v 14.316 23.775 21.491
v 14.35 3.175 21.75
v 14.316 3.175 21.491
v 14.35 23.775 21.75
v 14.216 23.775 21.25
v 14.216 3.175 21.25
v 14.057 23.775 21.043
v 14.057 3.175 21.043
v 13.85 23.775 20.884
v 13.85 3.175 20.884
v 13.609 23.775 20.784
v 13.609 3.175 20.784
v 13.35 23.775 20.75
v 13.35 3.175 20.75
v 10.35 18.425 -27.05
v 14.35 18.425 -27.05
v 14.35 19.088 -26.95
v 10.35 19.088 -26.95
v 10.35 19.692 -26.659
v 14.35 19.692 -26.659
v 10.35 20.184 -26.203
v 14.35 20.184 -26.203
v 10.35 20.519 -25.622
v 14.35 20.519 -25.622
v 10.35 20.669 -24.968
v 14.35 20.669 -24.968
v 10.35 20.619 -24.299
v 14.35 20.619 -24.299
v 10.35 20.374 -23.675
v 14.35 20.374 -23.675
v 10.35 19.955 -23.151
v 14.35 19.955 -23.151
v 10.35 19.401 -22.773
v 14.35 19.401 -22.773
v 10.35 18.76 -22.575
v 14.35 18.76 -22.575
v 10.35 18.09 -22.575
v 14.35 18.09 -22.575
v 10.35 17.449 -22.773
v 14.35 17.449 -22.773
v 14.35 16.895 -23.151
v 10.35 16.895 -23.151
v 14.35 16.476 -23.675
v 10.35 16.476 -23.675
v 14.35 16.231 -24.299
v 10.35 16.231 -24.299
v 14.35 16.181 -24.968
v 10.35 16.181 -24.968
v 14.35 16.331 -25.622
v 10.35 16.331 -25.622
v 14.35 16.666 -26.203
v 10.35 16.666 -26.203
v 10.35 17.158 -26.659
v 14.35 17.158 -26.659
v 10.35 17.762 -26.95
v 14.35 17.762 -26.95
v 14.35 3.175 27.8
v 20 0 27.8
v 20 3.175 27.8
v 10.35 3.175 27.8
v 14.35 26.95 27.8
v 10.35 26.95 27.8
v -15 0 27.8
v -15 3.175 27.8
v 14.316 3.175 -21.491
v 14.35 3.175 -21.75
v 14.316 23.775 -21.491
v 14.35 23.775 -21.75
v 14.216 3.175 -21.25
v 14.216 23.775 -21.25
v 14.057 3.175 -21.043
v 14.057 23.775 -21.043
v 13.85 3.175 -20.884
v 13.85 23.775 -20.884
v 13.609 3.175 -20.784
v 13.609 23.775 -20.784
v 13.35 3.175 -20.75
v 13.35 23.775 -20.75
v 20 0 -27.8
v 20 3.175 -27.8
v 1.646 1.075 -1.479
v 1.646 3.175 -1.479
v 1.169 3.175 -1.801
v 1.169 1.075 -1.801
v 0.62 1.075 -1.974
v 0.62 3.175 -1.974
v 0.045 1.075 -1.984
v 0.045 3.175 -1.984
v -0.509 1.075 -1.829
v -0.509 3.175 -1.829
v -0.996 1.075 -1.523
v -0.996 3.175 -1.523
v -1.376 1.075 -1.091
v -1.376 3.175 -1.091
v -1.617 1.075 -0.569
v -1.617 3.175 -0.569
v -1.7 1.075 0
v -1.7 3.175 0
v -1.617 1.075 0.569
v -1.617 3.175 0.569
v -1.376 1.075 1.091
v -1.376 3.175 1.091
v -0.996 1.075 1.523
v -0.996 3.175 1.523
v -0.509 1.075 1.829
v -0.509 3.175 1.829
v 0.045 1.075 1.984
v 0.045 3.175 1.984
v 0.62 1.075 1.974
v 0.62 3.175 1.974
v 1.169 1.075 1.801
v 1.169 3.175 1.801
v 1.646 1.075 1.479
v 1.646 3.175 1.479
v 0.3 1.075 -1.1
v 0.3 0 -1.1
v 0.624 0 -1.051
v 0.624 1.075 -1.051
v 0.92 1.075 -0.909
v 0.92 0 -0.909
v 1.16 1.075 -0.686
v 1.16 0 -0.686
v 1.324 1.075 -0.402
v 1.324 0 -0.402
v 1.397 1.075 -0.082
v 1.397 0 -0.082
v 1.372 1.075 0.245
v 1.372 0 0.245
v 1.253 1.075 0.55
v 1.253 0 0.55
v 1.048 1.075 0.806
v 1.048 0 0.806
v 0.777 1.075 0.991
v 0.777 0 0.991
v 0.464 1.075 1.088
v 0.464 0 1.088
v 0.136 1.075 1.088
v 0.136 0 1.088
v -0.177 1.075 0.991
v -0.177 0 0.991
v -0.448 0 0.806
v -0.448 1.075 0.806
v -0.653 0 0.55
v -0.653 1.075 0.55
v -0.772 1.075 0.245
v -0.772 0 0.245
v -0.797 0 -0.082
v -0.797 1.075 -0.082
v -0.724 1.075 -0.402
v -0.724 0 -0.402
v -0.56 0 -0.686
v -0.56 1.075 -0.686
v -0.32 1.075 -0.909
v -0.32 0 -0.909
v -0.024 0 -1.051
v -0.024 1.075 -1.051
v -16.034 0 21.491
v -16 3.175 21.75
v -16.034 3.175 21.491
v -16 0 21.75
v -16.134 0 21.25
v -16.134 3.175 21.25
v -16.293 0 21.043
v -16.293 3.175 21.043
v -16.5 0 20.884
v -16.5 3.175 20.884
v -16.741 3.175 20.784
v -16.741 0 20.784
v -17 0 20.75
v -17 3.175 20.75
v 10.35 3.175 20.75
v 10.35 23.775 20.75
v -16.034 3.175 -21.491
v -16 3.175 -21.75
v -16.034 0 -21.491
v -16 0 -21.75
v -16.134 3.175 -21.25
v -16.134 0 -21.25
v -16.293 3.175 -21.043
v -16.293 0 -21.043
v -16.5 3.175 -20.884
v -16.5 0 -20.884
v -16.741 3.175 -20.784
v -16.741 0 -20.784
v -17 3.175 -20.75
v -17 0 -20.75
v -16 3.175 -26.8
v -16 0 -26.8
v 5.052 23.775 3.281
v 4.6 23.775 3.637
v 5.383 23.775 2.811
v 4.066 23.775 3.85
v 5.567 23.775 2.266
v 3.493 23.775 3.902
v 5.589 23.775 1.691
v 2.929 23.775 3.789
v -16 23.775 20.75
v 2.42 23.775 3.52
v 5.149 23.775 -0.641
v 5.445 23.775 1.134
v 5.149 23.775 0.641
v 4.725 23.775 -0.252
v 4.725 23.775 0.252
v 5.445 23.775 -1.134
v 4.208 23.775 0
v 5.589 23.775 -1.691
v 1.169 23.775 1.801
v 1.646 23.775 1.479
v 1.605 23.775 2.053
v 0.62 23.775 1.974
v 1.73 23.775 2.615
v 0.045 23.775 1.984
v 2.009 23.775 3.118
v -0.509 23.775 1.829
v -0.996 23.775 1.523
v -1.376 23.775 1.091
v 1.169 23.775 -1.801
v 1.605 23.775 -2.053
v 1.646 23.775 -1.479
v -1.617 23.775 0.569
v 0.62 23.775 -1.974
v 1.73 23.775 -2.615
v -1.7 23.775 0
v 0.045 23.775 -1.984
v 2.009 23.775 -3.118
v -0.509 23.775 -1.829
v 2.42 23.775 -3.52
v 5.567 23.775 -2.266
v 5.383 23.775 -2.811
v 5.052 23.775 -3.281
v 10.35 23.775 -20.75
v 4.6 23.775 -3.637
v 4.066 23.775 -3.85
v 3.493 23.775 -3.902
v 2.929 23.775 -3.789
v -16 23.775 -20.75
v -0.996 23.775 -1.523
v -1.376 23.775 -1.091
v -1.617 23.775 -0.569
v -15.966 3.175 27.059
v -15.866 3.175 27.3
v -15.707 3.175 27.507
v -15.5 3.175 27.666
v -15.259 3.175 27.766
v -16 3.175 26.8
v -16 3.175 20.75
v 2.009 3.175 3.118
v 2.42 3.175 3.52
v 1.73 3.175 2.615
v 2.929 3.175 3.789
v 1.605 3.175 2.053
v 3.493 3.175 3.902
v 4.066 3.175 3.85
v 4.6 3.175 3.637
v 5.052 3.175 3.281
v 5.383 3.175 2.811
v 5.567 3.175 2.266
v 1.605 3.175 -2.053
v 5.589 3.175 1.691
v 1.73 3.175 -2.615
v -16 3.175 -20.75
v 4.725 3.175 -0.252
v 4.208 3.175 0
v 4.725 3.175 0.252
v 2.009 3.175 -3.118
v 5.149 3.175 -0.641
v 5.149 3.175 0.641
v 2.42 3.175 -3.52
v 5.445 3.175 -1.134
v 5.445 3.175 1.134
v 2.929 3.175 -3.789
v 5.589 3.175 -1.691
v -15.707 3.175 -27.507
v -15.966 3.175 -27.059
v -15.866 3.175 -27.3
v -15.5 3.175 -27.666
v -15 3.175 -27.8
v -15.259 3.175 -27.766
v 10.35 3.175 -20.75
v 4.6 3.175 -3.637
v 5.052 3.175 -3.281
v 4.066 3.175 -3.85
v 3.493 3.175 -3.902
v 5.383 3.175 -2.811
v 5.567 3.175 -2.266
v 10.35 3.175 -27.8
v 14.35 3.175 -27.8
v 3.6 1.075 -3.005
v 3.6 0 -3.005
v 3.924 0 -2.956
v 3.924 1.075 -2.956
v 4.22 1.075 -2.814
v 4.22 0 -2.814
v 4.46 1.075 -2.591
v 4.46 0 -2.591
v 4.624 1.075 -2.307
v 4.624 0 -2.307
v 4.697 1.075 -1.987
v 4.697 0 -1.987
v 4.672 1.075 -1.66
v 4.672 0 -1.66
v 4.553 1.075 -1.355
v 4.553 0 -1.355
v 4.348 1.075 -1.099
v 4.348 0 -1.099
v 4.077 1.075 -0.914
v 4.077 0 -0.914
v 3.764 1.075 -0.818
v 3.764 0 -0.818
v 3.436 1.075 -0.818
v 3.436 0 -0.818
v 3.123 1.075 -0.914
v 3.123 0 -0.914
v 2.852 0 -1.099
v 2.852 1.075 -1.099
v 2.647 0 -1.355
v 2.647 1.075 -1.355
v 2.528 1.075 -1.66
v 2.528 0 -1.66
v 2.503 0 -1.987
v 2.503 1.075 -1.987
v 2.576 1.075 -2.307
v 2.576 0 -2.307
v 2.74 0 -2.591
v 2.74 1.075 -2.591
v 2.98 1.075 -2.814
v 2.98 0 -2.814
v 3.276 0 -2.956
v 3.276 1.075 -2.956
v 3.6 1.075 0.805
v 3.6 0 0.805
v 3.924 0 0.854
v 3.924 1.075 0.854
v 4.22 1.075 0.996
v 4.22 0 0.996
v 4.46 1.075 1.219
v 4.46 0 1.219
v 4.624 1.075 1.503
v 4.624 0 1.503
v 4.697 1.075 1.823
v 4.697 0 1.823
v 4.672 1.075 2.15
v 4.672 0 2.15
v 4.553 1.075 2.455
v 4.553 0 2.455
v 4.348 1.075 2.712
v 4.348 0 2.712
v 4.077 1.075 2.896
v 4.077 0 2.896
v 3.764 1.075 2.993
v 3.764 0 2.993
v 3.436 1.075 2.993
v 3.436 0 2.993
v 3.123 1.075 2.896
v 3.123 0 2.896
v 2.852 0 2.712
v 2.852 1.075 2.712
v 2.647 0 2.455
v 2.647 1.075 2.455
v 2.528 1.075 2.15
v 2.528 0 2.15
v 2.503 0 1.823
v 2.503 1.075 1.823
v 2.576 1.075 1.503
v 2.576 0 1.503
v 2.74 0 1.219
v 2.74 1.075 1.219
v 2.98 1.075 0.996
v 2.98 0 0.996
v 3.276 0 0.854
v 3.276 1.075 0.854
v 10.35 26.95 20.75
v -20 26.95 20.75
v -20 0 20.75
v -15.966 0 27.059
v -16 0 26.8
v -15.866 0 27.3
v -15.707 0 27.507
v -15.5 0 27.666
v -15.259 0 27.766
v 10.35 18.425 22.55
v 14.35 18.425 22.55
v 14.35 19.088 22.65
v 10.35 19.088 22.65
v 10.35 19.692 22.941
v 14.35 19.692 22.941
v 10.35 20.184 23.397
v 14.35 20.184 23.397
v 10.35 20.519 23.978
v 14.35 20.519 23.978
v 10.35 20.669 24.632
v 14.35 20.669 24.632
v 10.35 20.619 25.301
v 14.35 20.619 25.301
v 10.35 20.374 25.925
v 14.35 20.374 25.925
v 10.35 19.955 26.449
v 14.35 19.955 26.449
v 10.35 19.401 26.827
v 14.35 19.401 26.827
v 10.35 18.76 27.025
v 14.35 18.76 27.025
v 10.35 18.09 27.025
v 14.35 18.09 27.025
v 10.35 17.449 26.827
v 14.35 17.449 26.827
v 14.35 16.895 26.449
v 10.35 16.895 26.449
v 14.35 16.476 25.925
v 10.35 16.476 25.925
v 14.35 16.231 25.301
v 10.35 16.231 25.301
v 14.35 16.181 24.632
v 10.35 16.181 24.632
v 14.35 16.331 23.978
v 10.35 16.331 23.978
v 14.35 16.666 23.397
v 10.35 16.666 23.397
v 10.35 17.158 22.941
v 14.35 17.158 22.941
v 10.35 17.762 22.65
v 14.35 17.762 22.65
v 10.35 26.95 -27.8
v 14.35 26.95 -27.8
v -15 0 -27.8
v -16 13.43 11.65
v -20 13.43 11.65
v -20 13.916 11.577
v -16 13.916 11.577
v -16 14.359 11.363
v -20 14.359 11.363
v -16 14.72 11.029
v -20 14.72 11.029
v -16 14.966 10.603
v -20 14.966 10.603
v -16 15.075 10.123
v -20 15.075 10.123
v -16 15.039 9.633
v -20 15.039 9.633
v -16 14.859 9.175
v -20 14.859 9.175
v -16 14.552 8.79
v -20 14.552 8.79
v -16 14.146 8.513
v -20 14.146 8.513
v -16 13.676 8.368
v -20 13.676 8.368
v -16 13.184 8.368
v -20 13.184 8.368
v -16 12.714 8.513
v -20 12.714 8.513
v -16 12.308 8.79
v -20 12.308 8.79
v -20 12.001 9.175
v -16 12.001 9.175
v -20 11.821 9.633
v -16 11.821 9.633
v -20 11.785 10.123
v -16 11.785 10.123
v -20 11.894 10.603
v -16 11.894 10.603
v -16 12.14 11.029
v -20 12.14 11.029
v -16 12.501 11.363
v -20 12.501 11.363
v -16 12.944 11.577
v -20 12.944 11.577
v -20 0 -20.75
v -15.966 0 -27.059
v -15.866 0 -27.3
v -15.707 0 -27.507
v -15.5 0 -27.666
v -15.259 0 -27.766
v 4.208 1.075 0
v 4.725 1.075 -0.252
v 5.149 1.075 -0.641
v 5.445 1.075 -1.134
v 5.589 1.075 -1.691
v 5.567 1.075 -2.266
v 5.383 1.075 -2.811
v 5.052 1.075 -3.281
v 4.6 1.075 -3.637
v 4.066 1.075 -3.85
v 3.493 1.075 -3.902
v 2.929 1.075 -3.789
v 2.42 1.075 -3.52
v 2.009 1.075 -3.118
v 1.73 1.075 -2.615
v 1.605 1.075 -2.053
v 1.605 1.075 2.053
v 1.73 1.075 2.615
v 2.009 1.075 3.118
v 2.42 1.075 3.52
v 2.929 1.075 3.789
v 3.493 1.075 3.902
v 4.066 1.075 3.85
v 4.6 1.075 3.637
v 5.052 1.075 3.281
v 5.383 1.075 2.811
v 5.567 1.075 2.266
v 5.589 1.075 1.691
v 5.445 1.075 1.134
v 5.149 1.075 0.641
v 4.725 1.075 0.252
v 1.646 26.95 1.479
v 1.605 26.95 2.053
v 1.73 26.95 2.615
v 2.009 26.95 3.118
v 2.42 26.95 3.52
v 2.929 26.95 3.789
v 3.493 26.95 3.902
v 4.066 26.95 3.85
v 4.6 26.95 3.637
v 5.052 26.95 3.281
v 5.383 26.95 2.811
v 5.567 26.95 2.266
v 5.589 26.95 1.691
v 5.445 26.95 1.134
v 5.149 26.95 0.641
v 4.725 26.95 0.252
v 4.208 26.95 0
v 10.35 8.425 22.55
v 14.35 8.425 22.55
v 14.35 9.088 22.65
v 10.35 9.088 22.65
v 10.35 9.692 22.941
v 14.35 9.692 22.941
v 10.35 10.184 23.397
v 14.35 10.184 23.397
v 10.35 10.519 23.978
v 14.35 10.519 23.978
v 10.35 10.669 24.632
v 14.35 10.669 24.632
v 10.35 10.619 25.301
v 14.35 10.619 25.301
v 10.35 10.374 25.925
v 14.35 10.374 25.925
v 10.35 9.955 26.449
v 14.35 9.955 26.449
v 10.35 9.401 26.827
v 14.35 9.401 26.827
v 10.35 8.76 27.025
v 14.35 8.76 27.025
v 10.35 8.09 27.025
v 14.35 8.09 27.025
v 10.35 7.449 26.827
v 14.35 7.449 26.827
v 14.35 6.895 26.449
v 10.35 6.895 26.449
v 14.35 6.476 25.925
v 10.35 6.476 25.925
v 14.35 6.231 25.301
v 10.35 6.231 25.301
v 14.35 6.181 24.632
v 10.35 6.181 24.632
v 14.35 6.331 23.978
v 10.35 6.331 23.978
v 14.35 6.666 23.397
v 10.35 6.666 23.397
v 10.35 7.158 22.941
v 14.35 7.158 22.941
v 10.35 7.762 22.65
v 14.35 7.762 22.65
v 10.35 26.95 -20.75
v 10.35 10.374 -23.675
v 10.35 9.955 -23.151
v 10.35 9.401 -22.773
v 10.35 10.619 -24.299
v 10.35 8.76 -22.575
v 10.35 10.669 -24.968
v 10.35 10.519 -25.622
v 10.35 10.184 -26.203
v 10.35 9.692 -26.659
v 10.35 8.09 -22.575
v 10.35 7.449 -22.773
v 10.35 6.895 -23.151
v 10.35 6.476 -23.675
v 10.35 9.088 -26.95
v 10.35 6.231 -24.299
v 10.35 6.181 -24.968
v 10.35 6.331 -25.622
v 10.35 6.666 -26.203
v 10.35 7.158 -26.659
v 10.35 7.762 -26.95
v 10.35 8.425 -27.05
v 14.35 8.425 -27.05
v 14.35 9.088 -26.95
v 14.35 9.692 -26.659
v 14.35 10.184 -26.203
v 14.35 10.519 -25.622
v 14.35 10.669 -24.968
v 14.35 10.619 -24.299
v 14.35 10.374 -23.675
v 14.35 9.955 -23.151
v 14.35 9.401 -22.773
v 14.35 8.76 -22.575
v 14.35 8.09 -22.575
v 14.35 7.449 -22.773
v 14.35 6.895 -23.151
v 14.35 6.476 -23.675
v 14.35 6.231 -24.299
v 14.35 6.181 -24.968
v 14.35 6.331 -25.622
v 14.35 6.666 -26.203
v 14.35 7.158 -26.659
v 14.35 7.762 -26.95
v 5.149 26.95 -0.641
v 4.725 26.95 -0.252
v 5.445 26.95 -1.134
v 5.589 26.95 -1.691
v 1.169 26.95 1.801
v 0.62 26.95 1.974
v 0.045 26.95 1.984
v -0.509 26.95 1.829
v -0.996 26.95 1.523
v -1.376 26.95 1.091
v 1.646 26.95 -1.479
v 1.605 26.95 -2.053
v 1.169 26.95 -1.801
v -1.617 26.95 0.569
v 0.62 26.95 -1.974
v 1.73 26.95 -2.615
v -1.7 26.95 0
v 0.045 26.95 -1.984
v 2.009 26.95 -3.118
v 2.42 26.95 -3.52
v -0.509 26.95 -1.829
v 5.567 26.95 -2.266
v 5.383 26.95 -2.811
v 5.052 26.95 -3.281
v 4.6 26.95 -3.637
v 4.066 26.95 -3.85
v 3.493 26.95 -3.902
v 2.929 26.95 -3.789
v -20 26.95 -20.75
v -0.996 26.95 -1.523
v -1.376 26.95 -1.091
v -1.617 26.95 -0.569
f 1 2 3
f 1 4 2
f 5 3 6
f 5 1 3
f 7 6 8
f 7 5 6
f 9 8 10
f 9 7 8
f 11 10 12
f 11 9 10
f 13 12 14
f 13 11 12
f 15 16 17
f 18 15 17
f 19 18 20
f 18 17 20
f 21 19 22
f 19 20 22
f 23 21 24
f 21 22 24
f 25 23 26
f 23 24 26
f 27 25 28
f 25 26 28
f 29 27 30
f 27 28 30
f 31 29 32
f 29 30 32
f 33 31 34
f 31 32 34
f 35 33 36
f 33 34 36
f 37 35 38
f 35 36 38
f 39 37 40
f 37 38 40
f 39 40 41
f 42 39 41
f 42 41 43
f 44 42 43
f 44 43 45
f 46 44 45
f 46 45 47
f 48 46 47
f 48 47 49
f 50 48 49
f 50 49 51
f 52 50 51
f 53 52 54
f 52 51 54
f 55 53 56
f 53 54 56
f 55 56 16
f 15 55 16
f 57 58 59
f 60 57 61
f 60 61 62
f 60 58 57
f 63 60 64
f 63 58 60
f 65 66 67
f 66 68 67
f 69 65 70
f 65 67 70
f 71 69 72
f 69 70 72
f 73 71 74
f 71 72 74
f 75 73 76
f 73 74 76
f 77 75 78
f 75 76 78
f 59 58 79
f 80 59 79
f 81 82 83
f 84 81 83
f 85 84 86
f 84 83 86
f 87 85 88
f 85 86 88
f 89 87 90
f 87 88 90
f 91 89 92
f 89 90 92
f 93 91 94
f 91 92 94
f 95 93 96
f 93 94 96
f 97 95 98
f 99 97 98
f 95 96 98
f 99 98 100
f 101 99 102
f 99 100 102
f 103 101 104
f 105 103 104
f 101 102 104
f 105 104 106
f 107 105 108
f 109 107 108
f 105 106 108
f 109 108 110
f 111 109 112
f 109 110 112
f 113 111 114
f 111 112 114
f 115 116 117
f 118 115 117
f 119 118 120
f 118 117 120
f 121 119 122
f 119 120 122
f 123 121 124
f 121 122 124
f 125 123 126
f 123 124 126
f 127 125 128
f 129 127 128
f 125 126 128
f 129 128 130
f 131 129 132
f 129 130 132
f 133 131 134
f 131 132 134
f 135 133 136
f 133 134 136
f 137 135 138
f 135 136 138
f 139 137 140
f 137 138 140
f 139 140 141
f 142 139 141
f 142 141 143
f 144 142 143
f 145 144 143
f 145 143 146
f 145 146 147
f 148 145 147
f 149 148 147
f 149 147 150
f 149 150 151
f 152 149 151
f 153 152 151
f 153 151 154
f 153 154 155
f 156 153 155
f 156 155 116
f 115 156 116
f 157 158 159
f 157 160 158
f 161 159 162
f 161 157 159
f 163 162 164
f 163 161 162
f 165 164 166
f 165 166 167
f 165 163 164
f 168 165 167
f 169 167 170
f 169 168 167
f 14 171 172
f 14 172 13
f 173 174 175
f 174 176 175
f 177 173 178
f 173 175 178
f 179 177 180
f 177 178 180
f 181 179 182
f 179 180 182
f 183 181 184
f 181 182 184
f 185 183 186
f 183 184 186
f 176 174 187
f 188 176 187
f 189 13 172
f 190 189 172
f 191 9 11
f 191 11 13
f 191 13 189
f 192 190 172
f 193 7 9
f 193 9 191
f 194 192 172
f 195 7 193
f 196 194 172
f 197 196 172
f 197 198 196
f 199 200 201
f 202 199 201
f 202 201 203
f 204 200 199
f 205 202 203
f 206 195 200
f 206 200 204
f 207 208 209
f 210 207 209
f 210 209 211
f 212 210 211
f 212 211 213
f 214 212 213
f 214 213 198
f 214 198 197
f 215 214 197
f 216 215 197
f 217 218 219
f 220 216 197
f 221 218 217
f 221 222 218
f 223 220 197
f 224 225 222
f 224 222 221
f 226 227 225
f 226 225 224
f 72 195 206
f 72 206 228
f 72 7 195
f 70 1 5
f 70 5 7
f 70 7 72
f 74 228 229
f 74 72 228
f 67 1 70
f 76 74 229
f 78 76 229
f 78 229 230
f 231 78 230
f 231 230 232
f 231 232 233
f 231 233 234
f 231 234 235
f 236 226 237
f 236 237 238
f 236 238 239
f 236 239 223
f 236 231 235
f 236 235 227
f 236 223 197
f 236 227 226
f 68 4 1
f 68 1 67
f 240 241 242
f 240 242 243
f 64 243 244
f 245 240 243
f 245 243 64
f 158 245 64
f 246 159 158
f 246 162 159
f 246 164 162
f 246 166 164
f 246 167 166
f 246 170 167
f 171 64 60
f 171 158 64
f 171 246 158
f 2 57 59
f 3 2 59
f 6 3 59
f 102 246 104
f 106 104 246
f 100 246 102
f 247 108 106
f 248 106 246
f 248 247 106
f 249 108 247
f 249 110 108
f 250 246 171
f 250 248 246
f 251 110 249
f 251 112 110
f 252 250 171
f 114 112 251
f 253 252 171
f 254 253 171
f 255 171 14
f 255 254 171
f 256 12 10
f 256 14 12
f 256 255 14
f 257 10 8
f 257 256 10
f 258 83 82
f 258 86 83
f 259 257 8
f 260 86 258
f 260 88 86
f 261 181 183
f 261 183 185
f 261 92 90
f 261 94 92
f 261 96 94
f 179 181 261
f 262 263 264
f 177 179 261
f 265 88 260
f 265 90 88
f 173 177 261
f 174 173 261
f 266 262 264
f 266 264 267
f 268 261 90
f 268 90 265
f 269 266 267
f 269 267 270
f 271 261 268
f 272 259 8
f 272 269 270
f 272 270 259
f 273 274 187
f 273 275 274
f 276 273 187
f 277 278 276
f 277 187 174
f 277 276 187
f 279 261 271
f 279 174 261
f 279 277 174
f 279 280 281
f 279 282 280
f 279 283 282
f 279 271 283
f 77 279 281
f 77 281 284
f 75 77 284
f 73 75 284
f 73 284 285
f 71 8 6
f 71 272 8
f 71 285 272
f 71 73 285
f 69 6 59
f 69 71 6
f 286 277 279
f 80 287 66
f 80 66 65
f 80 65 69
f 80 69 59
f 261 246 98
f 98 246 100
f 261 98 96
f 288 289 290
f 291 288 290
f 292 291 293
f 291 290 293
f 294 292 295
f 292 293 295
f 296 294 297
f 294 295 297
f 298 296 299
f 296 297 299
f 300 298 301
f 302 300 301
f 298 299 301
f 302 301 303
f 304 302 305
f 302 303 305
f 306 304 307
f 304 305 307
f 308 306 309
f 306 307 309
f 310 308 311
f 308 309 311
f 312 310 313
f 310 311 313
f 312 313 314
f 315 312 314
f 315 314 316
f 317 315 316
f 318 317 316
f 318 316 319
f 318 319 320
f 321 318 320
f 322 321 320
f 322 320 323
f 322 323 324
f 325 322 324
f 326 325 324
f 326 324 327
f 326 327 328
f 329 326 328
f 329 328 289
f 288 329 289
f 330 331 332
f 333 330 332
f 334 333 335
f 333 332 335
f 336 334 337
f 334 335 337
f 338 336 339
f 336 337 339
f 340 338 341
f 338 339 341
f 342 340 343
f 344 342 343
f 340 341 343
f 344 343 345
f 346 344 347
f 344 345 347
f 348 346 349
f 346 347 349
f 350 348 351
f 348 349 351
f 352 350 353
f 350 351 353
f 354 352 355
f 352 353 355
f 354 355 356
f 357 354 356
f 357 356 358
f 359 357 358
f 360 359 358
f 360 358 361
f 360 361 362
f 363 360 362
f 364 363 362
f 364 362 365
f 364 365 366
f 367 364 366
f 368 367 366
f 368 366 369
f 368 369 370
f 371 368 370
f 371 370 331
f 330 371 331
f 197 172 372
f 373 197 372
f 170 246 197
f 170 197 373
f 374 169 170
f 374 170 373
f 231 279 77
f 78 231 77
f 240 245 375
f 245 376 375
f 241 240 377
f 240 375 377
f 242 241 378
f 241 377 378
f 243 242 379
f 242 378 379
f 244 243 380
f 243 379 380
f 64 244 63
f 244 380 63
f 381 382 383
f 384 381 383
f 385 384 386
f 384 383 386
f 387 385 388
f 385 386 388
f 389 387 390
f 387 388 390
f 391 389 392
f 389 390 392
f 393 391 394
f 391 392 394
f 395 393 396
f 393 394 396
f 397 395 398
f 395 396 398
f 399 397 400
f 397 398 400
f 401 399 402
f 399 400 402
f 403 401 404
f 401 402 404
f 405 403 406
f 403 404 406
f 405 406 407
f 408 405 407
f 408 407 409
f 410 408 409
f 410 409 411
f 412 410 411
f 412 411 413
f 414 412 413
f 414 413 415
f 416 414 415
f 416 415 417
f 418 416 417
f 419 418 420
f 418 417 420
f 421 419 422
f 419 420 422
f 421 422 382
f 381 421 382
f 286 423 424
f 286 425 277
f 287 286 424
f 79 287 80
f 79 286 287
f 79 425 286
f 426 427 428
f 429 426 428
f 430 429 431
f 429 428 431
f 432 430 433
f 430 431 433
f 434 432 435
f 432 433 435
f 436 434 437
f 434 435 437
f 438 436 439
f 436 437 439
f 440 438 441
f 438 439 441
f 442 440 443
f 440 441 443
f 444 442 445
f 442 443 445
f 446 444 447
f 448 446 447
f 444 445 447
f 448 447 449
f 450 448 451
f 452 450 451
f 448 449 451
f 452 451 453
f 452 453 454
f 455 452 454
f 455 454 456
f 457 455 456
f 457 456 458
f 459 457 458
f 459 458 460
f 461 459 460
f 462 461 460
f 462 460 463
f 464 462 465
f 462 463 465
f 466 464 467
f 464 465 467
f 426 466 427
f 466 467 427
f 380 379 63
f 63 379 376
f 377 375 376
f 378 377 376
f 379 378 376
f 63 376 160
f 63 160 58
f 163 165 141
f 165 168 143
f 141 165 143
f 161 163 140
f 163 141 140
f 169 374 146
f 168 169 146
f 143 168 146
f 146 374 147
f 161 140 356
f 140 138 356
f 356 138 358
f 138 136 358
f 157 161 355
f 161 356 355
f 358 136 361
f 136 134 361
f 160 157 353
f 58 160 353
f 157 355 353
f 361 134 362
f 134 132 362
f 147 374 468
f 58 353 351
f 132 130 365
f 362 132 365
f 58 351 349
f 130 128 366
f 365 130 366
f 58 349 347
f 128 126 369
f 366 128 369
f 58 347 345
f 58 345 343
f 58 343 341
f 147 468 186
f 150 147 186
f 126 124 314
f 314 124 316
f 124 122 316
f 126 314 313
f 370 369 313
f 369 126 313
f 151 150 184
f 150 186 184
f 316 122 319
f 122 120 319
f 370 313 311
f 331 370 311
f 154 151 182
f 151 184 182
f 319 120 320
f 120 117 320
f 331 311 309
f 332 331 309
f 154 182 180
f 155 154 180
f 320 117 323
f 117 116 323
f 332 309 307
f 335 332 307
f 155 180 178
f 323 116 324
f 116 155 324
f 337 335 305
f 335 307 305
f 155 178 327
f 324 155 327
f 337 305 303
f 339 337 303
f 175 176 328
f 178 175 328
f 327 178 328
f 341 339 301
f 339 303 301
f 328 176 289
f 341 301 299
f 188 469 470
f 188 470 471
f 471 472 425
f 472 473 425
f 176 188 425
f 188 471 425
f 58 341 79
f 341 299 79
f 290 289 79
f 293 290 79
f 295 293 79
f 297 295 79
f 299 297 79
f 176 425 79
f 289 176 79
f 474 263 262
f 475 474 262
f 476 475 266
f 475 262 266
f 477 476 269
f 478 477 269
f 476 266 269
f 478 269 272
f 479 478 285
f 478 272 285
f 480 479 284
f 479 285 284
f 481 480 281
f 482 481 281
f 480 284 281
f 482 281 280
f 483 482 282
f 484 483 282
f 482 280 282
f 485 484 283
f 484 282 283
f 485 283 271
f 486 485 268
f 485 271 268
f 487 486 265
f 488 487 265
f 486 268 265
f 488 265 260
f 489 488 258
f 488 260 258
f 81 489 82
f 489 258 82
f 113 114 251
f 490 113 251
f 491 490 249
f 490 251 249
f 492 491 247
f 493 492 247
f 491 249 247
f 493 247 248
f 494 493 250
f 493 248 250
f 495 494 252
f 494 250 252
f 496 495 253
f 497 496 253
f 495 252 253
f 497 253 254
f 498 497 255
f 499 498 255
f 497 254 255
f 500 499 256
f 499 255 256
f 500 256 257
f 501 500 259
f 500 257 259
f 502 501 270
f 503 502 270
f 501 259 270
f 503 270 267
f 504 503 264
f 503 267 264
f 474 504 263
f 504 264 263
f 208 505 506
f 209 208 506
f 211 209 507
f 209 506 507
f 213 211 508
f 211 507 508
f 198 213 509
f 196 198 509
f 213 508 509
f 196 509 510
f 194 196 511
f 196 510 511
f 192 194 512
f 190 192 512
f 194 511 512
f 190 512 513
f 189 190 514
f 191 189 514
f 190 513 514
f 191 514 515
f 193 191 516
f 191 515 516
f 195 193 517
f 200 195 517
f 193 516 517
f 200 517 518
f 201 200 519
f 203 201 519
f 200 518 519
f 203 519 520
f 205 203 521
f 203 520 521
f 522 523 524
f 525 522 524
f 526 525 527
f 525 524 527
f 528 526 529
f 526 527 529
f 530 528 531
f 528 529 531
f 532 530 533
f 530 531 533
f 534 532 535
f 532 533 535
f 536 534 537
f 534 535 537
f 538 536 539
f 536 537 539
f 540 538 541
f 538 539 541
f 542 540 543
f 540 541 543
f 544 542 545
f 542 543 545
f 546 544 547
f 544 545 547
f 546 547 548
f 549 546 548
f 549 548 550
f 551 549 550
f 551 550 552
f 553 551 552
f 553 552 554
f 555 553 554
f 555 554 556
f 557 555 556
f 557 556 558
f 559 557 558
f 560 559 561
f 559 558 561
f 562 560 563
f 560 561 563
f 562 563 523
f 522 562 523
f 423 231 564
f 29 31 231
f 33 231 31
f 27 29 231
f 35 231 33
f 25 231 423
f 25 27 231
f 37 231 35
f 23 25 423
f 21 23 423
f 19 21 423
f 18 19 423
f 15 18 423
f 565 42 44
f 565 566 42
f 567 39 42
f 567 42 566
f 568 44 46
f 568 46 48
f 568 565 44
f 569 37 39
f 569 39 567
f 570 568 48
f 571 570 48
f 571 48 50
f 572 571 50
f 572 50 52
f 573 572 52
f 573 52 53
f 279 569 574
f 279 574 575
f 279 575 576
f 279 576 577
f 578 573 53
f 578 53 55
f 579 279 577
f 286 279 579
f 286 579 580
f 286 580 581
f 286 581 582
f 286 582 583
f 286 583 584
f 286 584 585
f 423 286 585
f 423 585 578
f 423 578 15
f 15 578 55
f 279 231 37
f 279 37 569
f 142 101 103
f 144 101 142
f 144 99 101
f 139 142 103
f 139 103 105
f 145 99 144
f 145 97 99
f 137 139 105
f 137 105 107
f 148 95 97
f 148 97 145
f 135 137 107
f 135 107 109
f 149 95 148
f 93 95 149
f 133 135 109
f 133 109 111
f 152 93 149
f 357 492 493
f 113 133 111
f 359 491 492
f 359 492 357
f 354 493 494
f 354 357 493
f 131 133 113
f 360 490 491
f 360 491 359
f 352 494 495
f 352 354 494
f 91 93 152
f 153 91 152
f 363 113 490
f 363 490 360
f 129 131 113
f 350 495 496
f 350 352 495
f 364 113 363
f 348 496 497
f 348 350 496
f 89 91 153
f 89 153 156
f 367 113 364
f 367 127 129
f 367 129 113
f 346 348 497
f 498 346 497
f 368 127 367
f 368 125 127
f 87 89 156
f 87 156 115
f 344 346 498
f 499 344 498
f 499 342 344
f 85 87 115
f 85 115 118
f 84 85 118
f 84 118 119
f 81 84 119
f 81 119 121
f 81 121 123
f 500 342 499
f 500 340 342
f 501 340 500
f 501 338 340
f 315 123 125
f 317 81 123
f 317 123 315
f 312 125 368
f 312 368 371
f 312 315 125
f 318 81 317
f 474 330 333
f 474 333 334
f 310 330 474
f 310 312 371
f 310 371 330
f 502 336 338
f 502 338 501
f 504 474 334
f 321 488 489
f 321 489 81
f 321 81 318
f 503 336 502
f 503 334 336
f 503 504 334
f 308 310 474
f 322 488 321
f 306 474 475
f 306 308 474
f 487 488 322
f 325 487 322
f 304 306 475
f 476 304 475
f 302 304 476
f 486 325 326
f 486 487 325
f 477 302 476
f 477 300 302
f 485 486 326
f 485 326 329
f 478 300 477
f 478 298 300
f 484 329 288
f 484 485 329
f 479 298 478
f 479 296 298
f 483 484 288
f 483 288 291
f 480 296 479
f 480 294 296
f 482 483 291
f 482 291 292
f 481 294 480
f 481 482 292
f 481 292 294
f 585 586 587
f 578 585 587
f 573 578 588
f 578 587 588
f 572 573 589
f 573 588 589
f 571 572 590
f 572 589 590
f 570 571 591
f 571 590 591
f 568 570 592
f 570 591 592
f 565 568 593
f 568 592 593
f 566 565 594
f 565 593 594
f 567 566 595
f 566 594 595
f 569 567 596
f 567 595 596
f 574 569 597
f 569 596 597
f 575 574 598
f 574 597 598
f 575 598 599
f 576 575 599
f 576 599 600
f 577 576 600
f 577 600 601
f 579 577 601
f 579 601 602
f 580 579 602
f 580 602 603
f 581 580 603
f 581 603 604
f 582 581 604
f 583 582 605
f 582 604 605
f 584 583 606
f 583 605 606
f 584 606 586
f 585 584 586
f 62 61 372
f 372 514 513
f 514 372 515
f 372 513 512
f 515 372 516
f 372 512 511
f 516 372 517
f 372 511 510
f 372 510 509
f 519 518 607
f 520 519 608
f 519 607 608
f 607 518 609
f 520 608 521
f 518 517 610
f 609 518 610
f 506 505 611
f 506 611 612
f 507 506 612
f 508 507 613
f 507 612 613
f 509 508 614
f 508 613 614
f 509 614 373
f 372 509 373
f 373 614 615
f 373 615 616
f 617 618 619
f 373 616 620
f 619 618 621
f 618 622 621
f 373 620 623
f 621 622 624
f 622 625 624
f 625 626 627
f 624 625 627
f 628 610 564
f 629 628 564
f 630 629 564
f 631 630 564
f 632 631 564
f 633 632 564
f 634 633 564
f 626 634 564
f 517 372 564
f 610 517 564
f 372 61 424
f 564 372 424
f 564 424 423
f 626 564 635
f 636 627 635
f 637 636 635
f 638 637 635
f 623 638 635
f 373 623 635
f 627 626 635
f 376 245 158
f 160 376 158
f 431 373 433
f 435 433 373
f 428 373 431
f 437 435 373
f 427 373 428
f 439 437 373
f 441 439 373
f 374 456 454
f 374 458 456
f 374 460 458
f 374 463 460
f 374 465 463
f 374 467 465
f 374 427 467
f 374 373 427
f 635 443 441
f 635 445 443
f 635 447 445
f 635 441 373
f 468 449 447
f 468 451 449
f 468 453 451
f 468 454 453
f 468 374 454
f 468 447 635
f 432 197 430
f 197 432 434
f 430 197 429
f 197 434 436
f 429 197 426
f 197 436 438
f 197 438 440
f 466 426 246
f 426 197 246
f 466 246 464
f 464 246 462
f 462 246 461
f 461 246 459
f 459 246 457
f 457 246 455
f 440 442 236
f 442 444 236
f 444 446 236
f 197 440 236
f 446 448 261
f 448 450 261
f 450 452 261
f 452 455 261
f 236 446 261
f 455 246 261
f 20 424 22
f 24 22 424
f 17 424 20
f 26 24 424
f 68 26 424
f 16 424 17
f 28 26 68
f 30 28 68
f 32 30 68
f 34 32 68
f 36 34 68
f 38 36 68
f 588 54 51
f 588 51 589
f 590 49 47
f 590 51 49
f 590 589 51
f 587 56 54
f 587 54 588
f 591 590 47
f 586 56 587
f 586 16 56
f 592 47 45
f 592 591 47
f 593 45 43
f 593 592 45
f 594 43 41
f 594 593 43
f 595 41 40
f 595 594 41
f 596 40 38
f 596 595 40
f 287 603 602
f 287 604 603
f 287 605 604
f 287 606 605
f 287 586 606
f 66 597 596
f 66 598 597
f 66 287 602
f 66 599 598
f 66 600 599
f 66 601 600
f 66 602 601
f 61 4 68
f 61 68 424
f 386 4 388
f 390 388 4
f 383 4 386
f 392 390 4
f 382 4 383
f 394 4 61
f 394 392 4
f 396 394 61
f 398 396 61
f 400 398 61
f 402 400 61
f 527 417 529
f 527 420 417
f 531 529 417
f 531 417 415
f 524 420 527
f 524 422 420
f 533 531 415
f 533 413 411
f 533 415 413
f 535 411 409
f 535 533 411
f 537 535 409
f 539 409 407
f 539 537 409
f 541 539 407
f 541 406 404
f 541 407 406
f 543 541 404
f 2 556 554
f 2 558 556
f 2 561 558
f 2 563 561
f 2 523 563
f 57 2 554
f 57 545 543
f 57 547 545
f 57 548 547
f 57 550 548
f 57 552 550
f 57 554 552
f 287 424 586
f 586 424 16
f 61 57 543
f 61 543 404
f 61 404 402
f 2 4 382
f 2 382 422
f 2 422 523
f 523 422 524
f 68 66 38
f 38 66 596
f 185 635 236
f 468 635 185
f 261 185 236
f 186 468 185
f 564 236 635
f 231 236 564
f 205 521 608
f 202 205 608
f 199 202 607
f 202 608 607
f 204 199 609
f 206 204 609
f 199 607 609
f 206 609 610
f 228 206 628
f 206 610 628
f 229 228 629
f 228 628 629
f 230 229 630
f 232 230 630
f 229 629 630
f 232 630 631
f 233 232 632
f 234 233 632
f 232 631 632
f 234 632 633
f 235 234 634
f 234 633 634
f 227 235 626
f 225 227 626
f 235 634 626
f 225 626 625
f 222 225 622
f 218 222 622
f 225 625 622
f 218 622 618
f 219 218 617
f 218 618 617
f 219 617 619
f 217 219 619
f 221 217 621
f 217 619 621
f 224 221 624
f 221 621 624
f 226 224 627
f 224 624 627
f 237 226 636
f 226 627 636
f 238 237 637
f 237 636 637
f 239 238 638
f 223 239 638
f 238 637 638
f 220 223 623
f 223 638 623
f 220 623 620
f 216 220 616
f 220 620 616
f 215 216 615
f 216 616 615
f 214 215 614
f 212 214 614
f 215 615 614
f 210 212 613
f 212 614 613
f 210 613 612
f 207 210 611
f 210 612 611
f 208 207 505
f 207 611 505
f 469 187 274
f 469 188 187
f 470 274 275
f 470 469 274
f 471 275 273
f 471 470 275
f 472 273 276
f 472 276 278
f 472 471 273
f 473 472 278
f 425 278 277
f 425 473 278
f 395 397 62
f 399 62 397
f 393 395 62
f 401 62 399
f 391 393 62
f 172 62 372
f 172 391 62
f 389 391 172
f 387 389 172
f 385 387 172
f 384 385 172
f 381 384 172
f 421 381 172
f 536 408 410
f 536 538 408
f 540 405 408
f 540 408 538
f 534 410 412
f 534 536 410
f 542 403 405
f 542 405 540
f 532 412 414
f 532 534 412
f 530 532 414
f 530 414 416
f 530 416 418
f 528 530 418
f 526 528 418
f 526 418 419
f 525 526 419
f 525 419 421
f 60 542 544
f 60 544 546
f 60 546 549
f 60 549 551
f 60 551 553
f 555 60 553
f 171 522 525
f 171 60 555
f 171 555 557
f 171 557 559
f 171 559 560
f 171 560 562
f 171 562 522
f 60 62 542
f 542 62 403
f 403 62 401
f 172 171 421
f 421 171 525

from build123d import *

# Parameters (mm, degrees)
SKETCH1_W           = 40
SKETCH1_H           = 55.6
BOSS_EXTRUDE1_DEPTH = 3.175
SKETCH2_W           = 4
SKETCH2_H           = 41.5
SKETCH2_H_2         = 7.05
BOSS_EXTRUDE2_DEPTH = 20.6
BOSS_EXTRUDE3_DEPTH = 3.175
SKETCH5_R           = 2.25
CUT_EXTRUDE2_DEPTH  = 4
SKETCH6_R           = 1.65
CUT_EXTRUDE3_DEPTH  = 4
FILLET1_R           = 1
SKETCH7_W           = 4
SKETCH7_H           = 7.05
CUT_EXTRUDE4_DEPTH  = 3.175
FILLET2_R           = 1
SKETCH8_R           = 1.1
CUT_EXTRUDE6_DEPTH  = 3.175
CUT_EXTRUDE7_DEPTH  = 2.1
CUT_EXTRUDE8_START  = 23.775
CUT_EXTRUDE8_DEPTH  = 23.775


with BuildPart() as part:
    # Sketch1 → Boss-Extrude1 (new body)
    with BuildSketch(Plane(origin=(0, 0, 0), x_dir=(1, 0, 0), z_dir=(0, 1, 0))):
        Rectangle(SKETCH1_W, SKETCH1_H)
    extrude(amount=BOSS_EXTRUDE1_DEPTH)

    # Sketch2 → Boss-Extrude2 (add)
    with BuildSketch(Plane(origin=(0, 3.175, 0), x_dir=(1, 0, 0), z_dir=(0, 1, 0))):
        with Locations((-18, 0)):
            Rectangle(SKETCH2_W, SKETCH2_H)
        with Locations((12.35, 24.275)):
            Rectangle(SKETCH2_W, SKETCH2_H_2)
        with Locations((12.35, -24.275)):
            Rectangle(SKETCH2_W, SKETCH2_H_2)
    extrude(amount=BOSS_EXTRUDE2_DEPTH)

    # Sketch3 → Boss-Extrude3 (add)
    with BuildSketch(Plane(origin=(0, 23.775, 0), x_dir=(1, 0, 0), z_dir=(0, 1, 0))):
        Polygon((-20, 20.75), (10.35, 20.75), (10.35, 27.8), (14.35, 27.8), (14.35, -27.8), (10.35, -27.8), (10.35, -20.75), (-20, -20.75), align=None)
    extrude(amount=BOSS_EXTRUDE3_DEPTH)

    # Sketch5 → Cut-Extrude2 (cut)
    with BuildSketch(Plane(origin=(14.35, 0, 0), x_dir=(0, 0, -1), z_dir=(1, 0, 0))):
        with Locations((-24.8, 8.425)):
            Circle(SKETCH5_R)
        with Locations((-24.8, 18.425)):
            Circle(SKETCH5_R)
        with Locations((24.8, 18.425)):
            Circle(SKETCH5_R)
        with Locations((24.8, 8.425)):
            Circle(SKETCH5_R)
    extrude(amount=-CUT_EXTRUDE2_DEPTH, mode=Mode.SUBTRACT)

    # Sketch6 → Cut-Extrude3 (cut)
    with BuildSketch(Plane.ZY.offset(20)):
        with Locations((10, 13.43)):
            Circle(SKETCH6_R)
    extrude(amount=-CUT_EXTRUDE3_DEPTH, mode=Mode.SUBTRACT)

    # Fillet1
    fillet1_edges = [part.edges().sort_by_distance(p)[0] for p in [
        (14.35, 13.475, 20.75),
        (14.35, 13.475, -20.75),
    ]]
    fillet(fillet1_edges, radius=FILLET1_R)

    # Sketch7 → Cut-Extrude4 (cut)
    with BuildSketch(Plane(origin=(0, 3.175, 0), x_dir=(1, 0, 0), z_dir=(0, 1, 0))):
        with Locations((-18, -24.275)):
            Rectangle(SKETCH7_W, SKETCH7_H)
        with Locations((-18, 24.275)):
            Rectangle(SKETCH7_W, SKETCH7_H)
    extrude(amount=-CUT_EXTRUDE4_DEPTH, mode=Mode.SUBTRACT)

    # Fillet2
    fillet2_edges = [part.edges().sort_by_distance(p)[0] for p in [
        (-16, 1.5875, 20.75),
        (-16, 1.5875, 27.8),
        (-16, 1.5875, -27.8),
        (-16, 1.5875, -20.75),
    ]]
    fillet(fillet2_edges, radius=FILLET2_R)

    # Sketch8 → Cut-Extrude6 (cut)
    with BuildSketch(Plane.XZ):
        with Locations(Location((3.6, 1.905255888, 0), (0, 0, 270))):
            Circle(SKETCH8_R)
        with Locations(Location((3.6, -1.905255888, 0), (0, 0, 270))):
            Circle(SKETCH8_R)
        with Locations(Location((0.3, 0, 0), (0, 0, 270))):
            Circle(SKETCH8_R)
    extrude(amount=-CUT_EXTRUDE6_DEPTH, mode=Mode.SUBTRACT)

    # Sketch9 → Cut-Extrude7 (cut)
    with BuildSketch(Plane(origin=(0, 3.175, 0), x_dir=(1, 0, 0), z_dir=(0, 1, 0))):
        with BuildLine():
            ThreePointArc((1.645861873, -1.479410632), (4.6, -3.637306696), (4.208276253, 0))
            ThreePointArc((4.208276253, 0), (4.6, 3.637306696), (1.645861873, 1.479410632))
            ThreePointArc((1.645861873, 1.479410632), (-1.7, 0), (1.645861873, -1.479410632))
        make_face()
    extrude(amount=-CUT_EXTRUDE7_DEPTH, mode=Mode.SUBTRACT)

    # Sketch10 → Cut-Extrude8 (cut)
    with BuildSketch(Plane(origin=(0, 3.175, 0), x_dir=(1, 0, 0), z_dir=(0, 1, 0)).offset(CUT_EXTRUDE8_START)):
        with BuildLine():
            ThreePointArc((1.645861873, -1.479410632), (4.6, -3.637306696), (4.208276253, 0))
            ThreePointArc((4.208276253, 0), (4.6, 3.637306696), (1.645861873, 1.479410632))
            ThreePointArc((1.645861873, 1.479410632), (-1.7, 0), (1.645861873, -1.479410632))
        make_face()
    extrude(amount=-CUT_EXTRUDE8_DEPTH, mode=Mode.SUBTRACT)


solid = part.part
